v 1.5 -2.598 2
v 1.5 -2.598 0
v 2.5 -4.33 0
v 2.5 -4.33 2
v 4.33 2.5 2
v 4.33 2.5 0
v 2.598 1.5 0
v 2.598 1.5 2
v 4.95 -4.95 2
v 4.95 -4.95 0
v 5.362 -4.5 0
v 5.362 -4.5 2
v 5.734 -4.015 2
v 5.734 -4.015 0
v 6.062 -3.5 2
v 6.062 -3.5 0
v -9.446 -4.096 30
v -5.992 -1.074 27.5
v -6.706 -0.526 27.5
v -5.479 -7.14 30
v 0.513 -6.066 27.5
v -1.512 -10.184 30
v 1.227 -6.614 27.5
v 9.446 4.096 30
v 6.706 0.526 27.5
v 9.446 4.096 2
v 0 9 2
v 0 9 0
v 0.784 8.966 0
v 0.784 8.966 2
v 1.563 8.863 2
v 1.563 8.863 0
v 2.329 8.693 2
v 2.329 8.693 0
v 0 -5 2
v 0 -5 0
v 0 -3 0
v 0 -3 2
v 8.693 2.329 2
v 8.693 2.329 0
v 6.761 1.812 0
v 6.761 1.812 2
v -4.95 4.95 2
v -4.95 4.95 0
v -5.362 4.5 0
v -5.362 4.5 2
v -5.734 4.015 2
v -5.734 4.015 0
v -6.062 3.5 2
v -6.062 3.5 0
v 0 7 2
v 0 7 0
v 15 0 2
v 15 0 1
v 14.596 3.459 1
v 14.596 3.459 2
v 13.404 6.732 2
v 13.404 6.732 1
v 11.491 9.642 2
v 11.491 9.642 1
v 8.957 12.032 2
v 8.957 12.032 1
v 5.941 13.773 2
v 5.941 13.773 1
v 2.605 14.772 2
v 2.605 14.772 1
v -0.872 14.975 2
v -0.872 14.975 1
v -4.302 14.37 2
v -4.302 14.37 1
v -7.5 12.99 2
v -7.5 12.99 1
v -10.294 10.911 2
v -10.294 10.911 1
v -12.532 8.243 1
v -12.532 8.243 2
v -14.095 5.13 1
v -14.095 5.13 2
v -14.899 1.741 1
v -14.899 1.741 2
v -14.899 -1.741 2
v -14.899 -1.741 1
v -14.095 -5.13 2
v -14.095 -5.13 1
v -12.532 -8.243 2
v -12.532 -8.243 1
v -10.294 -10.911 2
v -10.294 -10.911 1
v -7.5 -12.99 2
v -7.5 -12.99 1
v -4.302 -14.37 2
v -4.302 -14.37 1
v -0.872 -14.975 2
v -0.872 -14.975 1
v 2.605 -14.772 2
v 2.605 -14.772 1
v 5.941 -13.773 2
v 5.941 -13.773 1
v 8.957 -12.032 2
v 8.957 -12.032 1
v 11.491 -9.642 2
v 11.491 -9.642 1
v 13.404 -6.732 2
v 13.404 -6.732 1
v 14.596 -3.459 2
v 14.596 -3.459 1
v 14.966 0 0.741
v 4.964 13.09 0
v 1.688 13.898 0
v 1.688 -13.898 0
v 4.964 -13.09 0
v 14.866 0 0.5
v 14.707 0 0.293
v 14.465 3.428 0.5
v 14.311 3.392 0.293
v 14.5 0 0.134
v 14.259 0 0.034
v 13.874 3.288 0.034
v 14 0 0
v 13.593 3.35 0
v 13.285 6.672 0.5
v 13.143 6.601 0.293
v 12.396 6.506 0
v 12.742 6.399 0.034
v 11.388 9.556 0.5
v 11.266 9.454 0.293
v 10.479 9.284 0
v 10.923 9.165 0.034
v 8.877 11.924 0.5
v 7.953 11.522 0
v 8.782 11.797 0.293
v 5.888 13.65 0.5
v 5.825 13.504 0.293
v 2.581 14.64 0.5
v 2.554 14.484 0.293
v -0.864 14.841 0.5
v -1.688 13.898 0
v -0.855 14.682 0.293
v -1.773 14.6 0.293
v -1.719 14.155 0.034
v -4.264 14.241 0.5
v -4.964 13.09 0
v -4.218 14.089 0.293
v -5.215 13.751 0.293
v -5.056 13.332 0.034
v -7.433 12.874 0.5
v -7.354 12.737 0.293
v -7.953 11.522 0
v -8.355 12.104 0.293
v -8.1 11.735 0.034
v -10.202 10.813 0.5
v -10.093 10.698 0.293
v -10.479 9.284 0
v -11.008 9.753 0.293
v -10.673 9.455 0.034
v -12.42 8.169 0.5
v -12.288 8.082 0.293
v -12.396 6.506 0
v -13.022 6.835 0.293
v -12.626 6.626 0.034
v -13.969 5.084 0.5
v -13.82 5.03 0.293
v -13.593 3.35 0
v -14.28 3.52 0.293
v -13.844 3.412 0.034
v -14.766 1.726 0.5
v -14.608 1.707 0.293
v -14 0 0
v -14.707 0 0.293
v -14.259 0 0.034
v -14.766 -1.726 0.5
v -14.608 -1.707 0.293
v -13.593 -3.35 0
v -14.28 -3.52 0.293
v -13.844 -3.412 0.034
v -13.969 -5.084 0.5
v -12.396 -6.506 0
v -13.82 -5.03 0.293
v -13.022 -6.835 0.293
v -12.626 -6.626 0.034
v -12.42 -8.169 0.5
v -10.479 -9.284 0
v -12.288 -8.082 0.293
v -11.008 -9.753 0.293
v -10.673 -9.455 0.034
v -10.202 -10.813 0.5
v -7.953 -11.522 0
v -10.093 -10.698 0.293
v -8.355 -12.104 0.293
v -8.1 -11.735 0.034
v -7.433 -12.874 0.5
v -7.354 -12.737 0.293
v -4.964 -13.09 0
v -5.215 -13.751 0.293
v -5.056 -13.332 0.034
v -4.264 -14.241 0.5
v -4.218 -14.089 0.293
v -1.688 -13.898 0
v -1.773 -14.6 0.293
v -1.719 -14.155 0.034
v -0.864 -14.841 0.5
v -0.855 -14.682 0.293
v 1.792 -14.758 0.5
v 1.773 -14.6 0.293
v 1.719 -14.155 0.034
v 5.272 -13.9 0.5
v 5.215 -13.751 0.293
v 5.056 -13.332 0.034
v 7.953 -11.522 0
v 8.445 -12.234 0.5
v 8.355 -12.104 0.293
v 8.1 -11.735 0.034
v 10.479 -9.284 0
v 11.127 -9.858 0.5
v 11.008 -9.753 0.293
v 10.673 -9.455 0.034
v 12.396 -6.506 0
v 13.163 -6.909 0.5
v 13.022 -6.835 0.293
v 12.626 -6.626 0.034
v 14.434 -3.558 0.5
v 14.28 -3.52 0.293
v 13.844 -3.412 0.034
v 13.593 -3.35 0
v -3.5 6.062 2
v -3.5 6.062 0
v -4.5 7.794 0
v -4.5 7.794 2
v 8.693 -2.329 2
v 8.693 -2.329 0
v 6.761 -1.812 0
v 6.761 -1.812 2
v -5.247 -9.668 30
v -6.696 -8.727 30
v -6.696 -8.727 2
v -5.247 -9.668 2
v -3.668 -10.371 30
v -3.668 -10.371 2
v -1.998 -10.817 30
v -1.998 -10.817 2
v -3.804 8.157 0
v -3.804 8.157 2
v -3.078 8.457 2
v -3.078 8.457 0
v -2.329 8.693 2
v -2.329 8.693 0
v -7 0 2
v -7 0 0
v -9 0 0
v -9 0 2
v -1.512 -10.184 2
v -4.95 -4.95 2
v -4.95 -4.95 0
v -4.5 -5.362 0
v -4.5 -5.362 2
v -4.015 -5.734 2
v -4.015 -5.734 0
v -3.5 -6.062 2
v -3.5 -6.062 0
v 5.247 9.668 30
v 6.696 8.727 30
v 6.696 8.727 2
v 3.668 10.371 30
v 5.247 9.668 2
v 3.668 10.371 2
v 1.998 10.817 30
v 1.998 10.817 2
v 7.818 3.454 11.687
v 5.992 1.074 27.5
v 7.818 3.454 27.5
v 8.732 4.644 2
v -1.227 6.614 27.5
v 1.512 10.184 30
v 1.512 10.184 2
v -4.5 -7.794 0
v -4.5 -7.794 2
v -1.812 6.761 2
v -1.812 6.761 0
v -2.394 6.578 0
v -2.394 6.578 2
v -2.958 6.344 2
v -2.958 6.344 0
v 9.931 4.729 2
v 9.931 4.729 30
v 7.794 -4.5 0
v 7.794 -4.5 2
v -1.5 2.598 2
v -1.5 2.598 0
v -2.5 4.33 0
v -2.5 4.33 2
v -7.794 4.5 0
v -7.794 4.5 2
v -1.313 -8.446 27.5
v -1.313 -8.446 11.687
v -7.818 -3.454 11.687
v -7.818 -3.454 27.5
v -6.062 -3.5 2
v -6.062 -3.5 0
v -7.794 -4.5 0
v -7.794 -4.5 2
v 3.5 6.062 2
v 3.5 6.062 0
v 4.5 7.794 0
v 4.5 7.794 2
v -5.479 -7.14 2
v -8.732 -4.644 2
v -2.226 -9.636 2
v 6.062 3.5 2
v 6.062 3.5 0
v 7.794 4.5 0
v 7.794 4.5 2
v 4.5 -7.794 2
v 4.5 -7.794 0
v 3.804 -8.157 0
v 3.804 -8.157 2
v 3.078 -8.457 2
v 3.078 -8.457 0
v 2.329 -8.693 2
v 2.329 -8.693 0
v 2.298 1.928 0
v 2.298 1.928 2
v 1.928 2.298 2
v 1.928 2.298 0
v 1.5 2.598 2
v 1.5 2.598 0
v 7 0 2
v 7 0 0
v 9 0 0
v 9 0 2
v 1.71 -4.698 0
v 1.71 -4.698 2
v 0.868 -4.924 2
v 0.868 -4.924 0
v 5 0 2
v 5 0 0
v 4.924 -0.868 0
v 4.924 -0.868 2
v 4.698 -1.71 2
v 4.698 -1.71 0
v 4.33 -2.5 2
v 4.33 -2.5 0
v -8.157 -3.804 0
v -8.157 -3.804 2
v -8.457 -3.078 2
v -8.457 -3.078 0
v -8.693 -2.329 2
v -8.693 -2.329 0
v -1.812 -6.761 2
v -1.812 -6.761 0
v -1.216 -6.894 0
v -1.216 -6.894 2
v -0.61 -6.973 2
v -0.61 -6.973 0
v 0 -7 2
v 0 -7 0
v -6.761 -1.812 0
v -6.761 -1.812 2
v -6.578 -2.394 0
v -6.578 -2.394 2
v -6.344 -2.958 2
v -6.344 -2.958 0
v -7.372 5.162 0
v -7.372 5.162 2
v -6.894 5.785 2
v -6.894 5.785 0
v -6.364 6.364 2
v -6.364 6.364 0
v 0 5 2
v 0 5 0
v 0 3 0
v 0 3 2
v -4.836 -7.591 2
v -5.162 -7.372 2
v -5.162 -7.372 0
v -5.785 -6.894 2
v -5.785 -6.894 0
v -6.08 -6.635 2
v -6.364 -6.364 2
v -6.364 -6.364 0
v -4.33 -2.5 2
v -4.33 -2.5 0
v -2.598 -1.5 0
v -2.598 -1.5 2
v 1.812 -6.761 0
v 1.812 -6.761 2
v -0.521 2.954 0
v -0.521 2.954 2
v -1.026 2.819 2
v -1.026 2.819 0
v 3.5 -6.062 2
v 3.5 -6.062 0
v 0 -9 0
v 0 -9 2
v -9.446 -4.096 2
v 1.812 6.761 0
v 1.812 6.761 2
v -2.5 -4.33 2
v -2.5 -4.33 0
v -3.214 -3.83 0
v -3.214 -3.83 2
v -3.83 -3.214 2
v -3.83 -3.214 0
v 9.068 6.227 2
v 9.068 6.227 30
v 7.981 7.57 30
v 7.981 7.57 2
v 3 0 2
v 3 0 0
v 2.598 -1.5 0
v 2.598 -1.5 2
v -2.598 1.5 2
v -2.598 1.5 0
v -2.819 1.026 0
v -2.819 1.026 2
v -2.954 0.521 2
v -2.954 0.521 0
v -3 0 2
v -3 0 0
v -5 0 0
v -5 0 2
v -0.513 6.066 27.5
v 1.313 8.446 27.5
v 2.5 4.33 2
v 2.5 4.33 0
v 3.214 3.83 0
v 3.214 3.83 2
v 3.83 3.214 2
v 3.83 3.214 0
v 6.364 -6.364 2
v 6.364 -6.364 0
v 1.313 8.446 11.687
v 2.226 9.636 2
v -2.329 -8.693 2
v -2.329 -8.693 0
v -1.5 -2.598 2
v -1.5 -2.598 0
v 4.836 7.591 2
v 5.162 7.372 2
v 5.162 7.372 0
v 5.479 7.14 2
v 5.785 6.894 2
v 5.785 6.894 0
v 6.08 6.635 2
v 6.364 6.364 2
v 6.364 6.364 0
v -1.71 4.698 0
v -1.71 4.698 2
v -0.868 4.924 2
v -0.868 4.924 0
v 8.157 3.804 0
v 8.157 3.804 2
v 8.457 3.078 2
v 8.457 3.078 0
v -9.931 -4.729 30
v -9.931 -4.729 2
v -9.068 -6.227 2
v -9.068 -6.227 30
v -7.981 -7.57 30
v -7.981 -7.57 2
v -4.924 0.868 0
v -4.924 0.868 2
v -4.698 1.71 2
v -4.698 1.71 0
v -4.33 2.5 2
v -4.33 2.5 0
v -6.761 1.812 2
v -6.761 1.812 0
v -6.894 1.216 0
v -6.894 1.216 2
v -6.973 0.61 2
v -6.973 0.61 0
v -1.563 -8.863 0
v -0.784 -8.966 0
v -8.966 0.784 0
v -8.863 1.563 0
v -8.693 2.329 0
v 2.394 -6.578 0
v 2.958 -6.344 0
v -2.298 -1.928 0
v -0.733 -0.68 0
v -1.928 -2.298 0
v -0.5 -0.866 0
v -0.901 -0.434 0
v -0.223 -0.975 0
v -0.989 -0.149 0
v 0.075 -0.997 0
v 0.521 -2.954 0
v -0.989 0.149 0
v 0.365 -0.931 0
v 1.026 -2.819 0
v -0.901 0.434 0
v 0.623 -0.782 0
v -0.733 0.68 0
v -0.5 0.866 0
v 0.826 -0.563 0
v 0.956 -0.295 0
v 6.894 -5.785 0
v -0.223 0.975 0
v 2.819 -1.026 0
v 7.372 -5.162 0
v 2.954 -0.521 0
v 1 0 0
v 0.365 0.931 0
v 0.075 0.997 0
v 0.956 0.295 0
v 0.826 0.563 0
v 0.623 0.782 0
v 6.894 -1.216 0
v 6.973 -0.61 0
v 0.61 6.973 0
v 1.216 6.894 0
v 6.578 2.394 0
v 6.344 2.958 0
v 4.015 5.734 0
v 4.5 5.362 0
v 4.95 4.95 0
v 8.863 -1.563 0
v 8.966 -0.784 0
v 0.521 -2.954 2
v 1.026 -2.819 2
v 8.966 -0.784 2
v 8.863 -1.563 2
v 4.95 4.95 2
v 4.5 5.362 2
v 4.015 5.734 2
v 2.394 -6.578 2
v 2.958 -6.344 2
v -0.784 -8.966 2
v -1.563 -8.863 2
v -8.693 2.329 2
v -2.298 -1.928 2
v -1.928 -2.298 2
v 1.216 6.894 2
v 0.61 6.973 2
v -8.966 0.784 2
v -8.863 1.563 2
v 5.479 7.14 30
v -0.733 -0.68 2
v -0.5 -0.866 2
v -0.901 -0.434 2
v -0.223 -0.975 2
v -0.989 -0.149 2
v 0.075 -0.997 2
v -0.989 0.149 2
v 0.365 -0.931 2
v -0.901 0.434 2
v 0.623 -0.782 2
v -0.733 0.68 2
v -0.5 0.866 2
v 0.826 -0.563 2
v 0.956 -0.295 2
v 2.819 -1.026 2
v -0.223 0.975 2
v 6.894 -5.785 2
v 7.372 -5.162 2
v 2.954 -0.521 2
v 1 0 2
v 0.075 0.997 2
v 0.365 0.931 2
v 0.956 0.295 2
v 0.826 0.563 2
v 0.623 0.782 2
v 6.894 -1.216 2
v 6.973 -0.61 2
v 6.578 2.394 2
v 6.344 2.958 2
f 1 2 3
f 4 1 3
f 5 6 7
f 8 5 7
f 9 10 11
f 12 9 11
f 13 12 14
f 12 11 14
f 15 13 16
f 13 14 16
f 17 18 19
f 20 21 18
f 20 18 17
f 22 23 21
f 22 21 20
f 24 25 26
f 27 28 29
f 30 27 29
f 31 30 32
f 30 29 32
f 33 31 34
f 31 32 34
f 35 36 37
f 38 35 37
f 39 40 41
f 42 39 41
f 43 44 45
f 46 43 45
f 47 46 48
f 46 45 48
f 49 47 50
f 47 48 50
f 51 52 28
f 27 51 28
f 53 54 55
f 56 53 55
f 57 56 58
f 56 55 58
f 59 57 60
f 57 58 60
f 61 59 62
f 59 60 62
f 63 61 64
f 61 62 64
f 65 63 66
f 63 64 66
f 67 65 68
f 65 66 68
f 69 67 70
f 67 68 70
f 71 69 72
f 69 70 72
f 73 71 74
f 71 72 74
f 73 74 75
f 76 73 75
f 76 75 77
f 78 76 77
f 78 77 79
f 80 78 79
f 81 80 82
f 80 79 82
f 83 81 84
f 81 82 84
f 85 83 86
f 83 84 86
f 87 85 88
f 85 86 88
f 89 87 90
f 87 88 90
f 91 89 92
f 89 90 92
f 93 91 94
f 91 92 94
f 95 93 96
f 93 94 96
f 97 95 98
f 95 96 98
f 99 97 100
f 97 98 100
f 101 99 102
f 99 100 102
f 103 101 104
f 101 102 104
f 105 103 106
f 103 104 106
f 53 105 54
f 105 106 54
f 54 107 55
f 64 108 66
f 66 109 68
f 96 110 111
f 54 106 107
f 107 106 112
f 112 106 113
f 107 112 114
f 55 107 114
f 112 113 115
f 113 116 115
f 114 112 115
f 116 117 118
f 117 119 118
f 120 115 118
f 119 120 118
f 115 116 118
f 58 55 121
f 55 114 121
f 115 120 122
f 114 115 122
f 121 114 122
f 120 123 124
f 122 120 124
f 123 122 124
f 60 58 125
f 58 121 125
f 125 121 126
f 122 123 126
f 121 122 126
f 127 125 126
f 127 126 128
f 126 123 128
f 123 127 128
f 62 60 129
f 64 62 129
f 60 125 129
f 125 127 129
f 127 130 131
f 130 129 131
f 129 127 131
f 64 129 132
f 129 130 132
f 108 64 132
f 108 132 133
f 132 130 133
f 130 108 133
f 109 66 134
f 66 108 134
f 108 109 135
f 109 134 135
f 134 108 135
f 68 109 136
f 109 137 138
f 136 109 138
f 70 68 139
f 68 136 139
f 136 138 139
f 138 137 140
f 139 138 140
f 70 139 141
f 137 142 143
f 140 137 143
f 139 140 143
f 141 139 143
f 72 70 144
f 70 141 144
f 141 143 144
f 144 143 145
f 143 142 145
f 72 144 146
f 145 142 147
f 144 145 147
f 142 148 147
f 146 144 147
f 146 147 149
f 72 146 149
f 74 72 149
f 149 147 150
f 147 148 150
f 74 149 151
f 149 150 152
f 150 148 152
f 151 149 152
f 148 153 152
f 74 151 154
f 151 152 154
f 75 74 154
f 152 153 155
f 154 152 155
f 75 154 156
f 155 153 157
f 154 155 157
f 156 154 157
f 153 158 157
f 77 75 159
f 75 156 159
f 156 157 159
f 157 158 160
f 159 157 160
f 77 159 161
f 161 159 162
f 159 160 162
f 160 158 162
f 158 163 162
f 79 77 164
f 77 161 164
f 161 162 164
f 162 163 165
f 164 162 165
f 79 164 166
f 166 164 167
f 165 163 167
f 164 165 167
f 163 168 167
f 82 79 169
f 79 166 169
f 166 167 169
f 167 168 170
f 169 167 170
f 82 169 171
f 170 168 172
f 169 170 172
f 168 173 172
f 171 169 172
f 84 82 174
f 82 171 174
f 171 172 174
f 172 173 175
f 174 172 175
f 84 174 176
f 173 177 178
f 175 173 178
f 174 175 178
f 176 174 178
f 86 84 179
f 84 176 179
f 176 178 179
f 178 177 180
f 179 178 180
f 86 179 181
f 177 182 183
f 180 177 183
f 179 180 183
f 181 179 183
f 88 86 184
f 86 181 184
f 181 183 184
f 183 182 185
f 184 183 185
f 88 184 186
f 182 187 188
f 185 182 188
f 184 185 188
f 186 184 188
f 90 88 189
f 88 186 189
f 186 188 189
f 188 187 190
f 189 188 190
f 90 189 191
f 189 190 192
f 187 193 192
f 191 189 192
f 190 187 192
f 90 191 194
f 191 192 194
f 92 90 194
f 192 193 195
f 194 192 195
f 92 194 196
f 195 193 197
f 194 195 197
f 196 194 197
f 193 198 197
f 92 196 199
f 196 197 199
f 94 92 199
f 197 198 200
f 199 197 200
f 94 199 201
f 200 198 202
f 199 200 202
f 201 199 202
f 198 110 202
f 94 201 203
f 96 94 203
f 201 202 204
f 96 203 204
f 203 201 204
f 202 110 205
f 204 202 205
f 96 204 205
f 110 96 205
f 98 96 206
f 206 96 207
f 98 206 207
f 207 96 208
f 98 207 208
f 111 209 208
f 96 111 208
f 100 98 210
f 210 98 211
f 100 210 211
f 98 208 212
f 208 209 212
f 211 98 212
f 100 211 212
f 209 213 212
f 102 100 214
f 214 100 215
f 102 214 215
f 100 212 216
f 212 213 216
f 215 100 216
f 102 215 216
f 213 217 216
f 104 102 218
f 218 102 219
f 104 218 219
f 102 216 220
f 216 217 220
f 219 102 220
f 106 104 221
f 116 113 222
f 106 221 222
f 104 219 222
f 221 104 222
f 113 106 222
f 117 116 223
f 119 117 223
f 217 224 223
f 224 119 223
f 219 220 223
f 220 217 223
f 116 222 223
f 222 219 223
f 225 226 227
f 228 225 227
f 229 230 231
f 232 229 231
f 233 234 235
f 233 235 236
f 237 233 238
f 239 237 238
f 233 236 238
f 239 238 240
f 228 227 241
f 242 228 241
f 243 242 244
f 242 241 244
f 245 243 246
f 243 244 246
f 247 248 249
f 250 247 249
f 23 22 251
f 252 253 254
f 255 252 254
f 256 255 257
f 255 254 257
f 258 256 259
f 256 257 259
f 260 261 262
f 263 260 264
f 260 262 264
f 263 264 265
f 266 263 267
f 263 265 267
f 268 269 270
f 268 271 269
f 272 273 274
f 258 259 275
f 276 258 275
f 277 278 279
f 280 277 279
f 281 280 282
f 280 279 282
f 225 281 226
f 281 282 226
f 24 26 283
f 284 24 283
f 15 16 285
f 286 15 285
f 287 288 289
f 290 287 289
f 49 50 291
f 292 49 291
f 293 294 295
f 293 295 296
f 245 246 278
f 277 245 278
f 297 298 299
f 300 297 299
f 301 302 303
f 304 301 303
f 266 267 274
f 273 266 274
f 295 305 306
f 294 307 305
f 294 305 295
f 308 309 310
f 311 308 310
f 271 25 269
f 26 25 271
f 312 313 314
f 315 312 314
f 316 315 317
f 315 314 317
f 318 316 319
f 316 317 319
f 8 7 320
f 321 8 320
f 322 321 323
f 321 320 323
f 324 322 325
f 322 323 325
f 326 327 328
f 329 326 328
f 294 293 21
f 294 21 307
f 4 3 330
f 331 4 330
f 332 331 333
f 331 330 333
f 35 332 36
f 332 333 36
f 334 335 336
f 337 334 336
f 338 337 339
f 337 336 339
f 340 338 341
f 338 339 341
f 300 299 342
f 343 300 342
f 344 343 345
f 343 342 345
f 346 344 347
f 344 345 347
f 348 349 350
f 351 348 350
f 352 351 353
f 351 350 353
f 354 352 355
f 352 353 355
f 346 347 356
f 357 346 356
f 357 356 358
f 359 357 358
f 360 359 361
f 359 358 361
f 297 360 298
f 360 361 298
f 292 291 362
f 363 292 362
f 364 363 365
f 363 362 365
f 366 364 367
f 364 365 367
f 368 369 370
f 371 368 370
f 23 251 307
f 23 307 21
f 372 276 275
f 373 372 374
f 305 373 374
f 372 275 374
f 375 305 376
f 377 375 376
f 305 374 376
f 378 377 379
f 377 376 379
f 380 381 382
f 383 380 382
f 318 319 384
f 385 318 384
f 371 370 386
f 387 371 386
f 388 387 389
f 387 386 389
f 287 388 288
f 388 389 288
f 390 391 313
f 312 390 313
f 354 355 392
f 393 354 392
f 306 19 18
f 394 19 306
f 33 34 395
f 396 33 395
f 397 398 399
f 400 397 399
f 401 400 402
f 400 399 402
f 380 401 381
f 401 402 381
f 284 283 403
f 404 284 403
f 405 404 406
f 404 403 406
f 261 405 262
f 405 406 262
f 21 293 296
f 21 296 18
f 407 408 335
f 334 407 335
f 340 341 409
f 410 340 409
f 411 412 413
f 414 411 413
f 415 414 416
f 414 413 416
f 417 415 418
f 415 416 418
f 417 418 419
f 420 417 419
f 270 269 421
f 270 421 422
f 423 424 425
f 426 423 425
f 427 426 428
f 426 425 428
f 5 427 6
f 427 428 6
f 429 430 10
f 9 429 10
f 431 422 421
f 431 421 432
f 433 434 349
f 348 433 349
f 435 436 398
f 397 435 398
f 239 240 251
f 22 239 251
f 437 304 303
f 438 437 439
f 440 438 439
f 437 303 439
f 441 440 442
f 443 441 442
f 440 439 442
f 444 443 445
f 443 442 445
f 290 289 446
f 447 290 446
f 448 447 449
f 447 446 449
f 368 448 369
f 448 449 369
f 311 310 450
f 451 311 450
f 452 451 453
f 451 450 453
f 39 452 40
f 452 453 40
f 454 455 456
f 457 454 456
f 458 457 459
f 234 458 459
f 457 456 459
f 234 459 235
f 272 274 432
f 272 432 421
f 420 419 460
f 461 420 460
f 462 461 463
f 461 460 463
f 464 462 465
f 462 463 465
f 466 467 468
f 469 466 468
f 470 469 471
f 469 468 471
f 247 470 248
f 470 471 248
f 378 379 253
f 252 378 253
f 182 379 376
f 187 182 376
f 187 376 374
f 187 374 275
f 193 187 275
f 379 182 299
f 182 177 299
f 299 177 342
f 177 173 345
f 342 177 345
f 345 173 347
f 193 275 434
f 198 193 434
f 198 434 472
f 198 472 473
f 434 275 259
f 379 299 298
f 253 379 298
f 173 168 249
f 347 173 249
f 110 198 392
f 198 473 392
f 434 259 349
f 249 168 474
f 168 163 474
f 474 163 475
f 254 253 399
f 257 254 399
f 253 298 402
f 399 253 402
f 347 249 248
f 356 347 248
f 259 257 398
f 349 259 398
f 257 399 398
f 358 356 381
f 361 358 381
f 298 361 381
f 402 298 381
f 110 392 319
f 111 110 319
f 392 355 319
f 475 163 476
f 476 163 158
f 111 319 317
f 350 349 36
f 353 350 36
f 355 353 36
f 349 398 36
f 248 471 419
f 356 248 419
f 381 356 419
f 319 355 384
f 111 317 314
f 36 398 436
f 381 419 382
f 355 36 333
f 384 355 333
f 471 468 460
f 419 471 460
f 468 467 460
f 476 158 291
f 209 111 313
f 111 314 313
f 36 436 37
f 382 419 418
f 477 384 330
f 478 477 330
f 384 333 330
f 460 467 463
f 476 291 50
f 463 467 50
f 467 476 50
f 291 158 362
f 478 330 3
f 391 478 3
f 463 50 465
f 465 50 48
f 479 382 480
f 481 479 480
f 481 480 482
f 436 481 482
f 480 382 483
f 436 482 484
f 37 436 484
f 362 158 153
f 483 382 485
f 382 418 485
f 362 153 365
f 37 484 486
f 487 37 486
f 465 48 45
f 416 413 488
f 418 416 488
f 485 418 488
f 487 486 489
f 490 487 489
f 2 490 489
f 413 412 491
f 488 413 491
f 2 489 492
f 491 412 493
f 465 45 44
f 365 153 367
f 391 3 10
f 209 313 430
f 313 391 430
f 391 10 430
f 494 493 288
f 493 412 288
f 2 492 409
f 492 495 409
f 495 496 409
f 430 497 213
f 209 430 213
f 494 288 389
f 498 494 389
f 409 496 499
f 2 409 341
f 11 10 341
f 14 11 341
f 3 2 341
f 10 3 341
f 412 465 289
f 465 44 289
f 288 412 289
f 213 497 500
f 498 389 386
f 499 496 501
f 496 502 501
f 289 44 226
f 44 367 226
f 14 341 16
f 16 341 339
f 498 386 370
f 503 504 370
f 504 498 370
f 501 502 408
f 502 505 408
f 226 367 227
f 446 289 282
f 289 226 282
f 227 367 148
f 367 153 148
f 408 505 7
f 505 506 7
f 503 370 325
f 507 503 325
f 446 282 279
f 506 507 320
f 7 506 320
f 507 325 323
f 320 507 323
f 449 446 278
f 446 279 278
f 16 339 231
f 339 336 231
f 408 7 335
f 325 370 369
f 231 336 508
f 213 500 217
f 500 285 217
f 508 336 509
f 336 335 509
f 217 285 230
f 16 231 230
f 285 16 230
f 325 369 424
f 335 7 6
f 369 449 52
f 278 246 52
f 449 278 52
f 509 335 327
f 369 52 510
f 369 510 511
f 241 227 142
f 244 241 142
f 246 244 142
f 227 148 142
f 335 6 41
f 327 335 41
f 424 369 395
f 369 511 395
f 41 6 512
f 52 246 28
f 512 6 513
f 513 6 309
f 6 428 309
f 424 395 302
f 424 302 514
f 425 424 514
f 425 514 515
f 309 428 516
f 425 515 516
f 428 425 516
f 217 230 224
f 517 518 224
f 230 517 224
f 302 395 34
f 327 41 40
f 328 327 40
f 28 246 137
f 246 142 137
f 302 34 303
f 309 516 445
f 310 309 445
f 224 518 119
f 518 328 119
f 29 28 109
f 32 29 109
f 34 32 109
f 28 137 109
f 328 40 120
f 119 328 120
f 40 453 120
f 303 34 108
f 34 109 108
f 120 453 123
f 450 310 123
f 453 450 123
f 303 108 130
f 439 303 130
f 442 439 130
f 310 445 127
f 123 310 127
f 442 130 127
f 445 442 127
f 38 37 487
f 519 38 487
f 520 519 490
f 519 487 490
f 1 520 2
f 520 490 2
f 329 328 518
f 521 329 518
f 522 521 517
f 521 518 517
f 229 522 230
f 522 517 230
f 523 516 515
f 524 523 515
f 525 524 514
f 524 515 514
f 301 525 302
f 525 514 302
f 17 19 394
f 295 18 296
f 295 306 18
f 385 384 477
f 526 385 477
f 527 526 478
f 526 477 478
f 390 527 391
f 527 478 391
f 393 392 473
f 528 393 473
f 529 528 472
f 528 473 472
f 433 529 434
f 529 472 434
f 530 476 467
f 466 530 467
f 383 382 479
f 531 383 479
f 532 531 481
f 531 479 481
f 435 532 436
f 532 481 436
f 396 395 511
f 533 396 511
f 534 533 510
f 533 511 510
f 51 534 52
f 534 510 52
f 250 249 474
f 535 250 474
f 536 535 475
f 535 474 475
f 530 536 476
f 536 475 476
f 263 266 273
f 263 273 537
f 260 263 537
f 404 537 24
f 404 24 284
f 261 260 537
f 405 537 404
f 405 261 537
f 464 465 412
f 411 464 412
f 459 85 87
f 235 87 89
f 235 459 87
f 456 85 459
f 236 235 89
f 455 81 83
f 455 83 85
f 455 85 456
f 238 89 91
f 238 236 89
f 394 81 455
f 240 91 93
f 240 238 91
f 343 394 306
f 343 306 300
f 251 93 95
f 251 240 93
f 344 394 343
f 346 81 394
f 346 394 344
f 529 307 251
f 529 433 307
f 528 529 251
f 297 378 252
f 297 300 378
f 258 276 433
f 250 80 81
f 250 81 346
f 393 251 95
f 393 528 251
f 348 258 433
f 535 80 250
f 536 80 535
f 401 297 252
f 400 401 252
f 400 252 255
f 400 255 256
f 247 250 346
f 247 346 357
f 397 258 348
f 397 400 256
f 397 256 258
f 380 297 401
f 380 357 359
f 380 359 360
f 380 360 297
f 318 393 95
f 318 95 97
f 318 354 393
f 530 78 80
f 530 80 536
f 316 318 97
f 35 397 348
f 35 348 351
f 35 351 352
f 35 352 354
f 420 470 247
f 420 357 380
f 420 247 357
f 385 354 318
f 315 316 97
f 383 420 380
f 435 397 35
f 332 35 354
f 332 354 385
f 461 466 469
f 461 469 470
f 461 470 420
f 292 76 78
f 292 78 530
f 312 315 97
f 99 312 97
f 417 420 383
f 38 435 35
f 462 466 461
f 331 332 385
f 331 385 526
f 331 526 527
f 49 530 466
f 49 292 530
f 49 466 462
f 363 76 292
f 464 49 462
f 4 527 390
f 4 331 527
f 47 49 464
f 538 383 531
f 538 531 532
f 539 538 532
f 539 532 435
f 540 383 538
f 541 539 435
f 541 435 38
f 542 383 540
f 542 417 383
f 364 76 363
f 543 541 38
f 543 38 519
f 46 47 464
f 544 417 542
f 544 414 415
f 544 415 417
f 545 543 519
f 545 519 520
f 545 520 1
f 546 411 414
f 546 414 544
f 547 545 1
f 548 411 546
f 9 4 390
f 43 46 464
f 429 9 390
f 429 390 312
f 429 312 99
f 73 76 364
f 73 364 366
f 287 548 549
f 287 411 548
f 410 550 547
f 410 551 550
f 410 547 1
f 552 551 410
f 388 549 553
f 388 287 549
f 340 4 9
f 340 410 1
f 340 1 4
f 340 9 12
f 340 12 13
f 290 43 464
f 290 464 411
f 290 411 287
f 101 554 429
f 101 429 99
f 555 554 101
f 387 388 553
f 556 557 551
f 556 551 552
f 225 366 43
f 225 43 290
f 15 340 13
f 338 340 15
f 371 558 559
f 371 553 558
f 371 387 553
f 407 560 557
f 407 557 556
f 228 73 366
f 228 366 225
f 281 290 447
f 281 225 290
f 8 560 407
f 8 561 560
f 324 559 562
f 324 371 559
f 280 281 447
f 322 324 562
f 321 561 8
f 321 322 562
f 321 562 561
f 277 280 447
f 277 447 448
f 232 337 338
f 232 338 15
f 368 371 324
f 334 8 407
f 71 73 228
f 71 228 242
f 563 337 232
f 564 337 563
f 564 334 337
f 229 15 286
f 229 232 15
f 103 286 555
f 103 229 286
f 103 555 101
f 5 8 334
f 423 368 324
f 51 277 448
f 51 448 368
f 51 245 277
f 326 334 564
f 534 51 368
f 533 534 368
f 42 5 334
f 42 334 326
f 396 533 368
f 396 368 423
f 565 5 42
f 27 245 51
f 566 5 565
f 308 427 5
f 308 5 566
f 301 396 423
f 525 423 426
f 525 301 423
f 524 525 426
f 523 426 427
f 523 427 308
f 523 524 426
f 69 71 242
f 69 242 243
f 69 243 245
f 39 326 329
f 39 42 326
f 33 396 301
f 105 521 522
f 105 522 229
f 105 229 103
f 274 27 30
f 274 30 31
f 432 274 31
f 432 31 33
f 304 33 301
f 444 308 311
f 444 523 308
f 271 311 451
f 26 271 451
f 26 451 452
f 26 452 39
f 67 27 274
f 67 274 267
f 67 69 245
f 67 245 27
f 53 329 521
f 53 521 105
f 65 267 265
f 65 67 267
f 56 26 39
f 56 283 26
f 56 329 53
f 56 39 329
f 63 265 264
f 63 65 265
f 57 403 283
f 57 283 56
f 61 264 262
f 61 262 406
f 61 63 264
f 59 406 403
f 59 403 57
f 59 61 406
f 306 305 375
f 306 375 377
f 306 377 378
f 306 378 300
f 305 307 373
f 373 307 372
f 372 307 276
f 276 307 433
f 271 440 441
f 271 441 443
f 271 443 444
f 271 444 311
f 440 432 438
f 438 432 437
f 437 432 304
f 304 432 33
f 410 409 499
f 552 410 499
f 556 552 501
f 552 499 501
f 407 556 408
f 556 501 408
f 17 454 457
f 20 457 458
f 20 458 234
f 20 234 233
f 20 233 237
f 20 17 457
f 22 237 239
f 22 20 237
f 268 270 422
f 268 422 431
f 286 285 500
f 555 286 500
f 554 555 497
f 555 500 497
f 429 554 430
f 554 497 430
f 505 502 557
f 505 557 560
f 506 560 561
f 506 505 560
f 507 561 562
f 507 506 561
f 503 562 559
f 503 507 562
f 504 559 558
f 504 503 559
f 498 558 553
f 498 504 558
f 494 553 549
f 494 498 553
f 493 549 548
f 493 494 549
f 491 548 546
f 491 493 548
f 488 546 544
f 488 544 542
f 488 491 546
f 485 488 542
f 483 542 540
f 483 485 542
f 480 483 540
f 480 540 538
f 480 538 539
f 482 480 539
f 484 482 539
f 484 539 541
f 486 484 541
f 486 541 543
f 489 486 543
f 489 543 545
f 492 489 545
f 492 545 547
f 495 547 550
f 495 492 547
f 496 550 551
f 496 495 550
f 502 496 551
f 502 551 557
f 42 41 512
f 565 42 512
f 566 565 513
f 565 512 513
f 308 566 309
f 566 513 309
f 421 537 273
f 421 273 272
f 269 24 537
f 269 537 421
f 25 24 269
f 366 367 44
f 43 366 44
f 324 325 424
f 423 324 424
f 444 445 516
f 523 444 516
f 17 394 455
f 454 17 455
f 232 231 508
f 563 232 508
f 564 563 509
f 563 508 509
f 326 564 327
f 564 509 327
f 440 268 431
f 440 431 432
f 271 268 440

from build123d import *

# Parameters (mm, degrees)
F0_R     = 15
F0_R_2   = 1
F1_DEPTH = 2
F3_DEPTH = 28
F5_DEPTH = 10
F7_DEPTH = 0.9
F9_DEPTH = 0.9
F10_R    = 1


with BuildPart() as f1:
    # F0 (on Top) → F1 (new body)
    with BuildSketch(Plane.XY):
        Circle(F0_R)
        with BuildLine():
            Line((0, -7), (0, -9))
            ThreePointArc((0, -9), (-1.17473573, -8.9230037524), (-2.3293714059, -8.6933324366))
            Line((-2.3293714059, -8.6933324366), (-1.8117333157, -6.761480784))
            ThreePointArc((-1.8117333157, -6.761480784), (-0.9136833455, -6.9401140296), (0, -7))
        make_face(mode=Mode.SUBTRACT)
        with BuildLine():
            Line((-3.5, -6.0621778265), (-4.5, -7.7942286341))
            ThreePointArc((-4.5, -7.7942286341), (-5.4788528611, -7.1401800626), (-6.3639610307, -6.3639610307))
            Line((-6.3639610307, -6.3639610307), (-4.9497474683, -4.9497474683))
            ThreePointArc((-4.9497474683, -4.9497474683), (-4.2613300031, -5.553473382), (-3.5, -6.0621778265))
        make_face(mode=Mode.SUBTRACT)
        with BuildLine():
            Line((-6.0621778265, -3.5), (-7.7942286341, -4.5))
            ThreePointArc((-7.7942286341, -4.5), (-8.3149157926, -3.4441508913), (-8.6933324366, -2.3293714059))
            Line((-8.6933324366, -2.3293714059), (-6.761480784, -1.8117333157))
            ThreePointArc((-6.761480784, -1.8117333157), (-6.4671567276, -2.6787840266), (-6.0621778265, -3.5))
        make_face(mode=Mode.SUBTRACT)
        with BuildLine():
            Line((-4.3301270189, -2.5), (-2.5980762114, -1.5))
            ThreePointArc((-2.5980762114, -1.5), (-2.1213203436, -2.1213203436), (-1.5, -2.5980762114))
            Line((-1.5, -2.5980762114), (-2.5, -4.3301270189))
            ThreePointArc((-2.5, -4.3301270189), (-3.5355339059, -3.5355339059), (-4.3301270189, -2.5))
        make_face(mode=Mode.SUBTRACT)
        with BuildLine():
            Line((3.5, -6.0621778265), (4.5, -7.7942286341))
            ThreePointArc((4.5, -7.7942286341), (3.4441508913, -8.3149157926), (2.3293714059, -8.6933324366))
            Line((2.3293714059, -8.6933324366), (1.8117333157, -6.761480784))
            ThreePointArc((1.8117333157, -6.761480784), (2.6787840266, -6.4671567276), (3.5, -6.0621778265))
        make_face(mode=Mode.SUBTRACT)
        with BuildLine():
            Line((0, -5), (0, -3))
            ThreePointArc((0, -3), (0.7764571353, -2.8977774789), (1.5, -2.5980762114))
            Line((1.5, -2.5980762114), (2.5, -4.3301270189))
            ThreePointArc((2.5, -4.3301270189), (1.2940952255, -4.8296291314), (0, -5))
        make_face(mode=Mode.SUBTRACT)
        with BuildLine():
            Line((6.0621778265, -3.5), (7.7942286341, -4.5))
            ThreePointArc((7.7942286341, -4.5), (7.1401800626, -5.4788528611), (6.3639610307, -6.3639610307))
            Line((6.3639610307, -6.3639610307), (4.9497474683, -4.9497474683))
            ThreePointArc((4.9497474683, -4.9497474683), (5.553473382, -4.2613300031), (6.0621778265, -3.5))
        make_face(mode=Mode.SUBTRACT)
        with BuildLine():
            Line((4.3301270189, -2.5), (2.5980762114, -1.5))
            ThreePointArc((2.5980762114, -1.5), (2.8977774789, -0.7764571353), (3, 0))
            Line((3, 0), (5, 0))
            ThreePointArc((5, 0), (4.8296291314, -1.2940952255), (4.3301270189, -2.5))
        make_face(mode=Mode.SUBTRACT)
        with BuildLine():
            Line((7, 0), (9, 0))
            ThreePointArc((9, 0), (8.9230037524, -1.17473573), (8.6933324366, -2.3293714059))
            Line((8.6933324366, -2.3293714059), (6.761480784, -1.8117333157))
            ThreePointArc((6.761480784, -1.8117333157), (6.9401140296, -0.9136833455), (7, 0))
        make_face(mode=Mode.SUBTRACT)
        with BuildLine():
            ThreePointArc((-6.761480784, 1.8117333157), (-6.9401140296, 0.9136833455), (-7, 0))
            Line((-7, 0), (-9, 0))
            ThreePointArc((-9, 0), (-8.9230037524, 1.17473573), (-8.6933324366, 2.3293714059))
            Line((-8.6933324366, 2.3293714059), (-6.761480784, 1.8117333157))
        make_face(mode=Mode.SUBTRACT)
        with BuildLine():
            ThreePointArc((-2.5980762114, 1.5), (-2.8977774789, 0.7764571353), (-3, 0))
            Line((-3, 0), (-5, 0))
            ThreePointArc((-5, 0), (-4.8296291314, 1.2940952255), (-4.3301270189, 2.5))
            Line((-4.3301270189, 2.5), (-2.5980762114, 1.5))
        make_face(mode=Mode.SUBTRACT)
        with BuildLine():
            Line((-6.0621778265, 3.5), (-7.7942286341, 4.5))
            ThreePointArc((-7.7942286341, 4.5), (-7.1401800626, 5.4788528611), (-6.3639610307, 6.3639610307))
            Line((-6.3639610307, 6.3639610307), (-4.9497474683, 4.9497474683))
            ThreePointArc((-4.9497474683, 4.9497474683), (-5.553473382, 4.2613300031), (-6.0621778265, 3.5))
        make_face(mode=Mode.SUBTRACT)
        with BuildLine():
            ThreePointArc((0, 3), (-0.7764571353, 2.8977774789), (-1.5, 2.5980762114))
            Line((-1.5, 2.5980762114), (-2.5, 4.3301270189))
            ThreePointArc((-2.5, 4.3301270189), (-1.2940952255, 4.8296291314), (0, 5))
            Line((0, 5), (0, 3))
        make_face(mode=Mode.SUBTRACT)
        with BuildLine():
            Line((-3.5, 6.0621778265), (-4.5, 7.7942286341))
            ThreePointArc((-4.5, 7.7942286341), (-3.4441508913, 8.3149157926), (-2.3293714059, 8.6933324366))
            Line((-2.3293714059, 8.6933324366), (-1.8117333157, 6.761480784))
            ThreePointArc((-1.8117333157, 6.761480784), (-2.6787840266, 6.4671567276), (-3.5, 6.0621778265))
        make_face(mode=Mode.SUBTRACT)
        Circle(F0_R_2, mode=Mode.SUBTRACT)
        with BuildLine():
            Line((4.3301270189, 2.5), (2.5980762114, 1.5))
            ThreePointArc((2.5980762114, 1.5), (2.1213203436, 2.1213203436), (1.5, 2.5980762114))
            Line((1.5, 2.5980762114), (2.5, 4.3301270189))
            ThreePointArc((2.5, 4.3301270189), (3.5355339059, 3.5355339059), (4.3301270189, 2.5))
        make_face(mode=Mode.SUBTRACT)
        with BuildLine():
            Line((6.0621778265, 3.5), (7.7942286341, 4.5))
            ThreePointArc((7.7942286341, 4.5), (8.3149157926, 3.4441508913), (8.6933324366, 2.3293714059))
            Line((8.6933324366, 2.3293714059), (6.761480784, 1.8117333157))
            ThreePointArc((6.761480784, 1.8117333157), (6.4671567276, 2.6787840266), (6.0621778265, 3.5))
        make_face(mode=Mode.SUBTRACT)
        with BuildLine():
            Line((3.5, 6.0621778265), (4.5, 7.7942286341))
            ThreePointArc((4.5, 7.7942286341), (5.4788528611, 7.1401800626), (6.3639610307, 6.3639610307))
            Line((6.3639610307, 6.3639610307), (4.9497474683, 4.9497474683))
            ThreePointArc((4.9497474683, 4.9497474683), (4.2613300031, 5.553473382), (3.5, 6.0621778265))
        make_face(mode=Mode.SUBTRACT)
        with BuildLine():
            Line((0, 7), (0, 9))
            ThreePointArc((0, 9), (1.17473573, 8.9230037524), (2.3293714059, 8.6933324366))
            Line((2.3293714059, 8.6933324366), (1.8117333157, 6.761480784))
            ThreePointArc((1.8117333157, 6.761480784), (0.9136833455, 6.9401140296), (0, 7))
        make_face(mode=Mode.SUBTRACT)
    extrude(amount=F1_DEPTH)

    # F2 (on face) → F3 (join)
    with BuildSketch(Plane.XY.offset(2)):
        with BuildLine():
            Line((6.6963757191, 8.7268867432), (5.4788528611, 7.1401800626))
            Line((5.4788528342, 7.1401800833), (9.4456195625, 4.0963729176))
            Line((9.4456195625, 4.0963729176), (9.9313862061, 4.7294363327))
            ThreePointArc((9.9313862061, 4.7294363327), (8.5507613173, 6.9198613349), (6.6963757191, 8.7268867432))
        make_face()
        with BuildLine():
            Line((1.9978528032, 10.8170506228), (1.5120861596, 10.1839872077))
            Line((1.5120861596, 10.1839872077), (5.4788528342, 7.1401800833))
            Line((5.4788528611, 7.1401800626), (6.6963757191, 8.7268867432))
            ThreePointArc((6.6963757191, 8.7268867432), (4.4709728986, 10.0503930938), (1.9978528032, 10.8170506228))
        make_face()
        with BuildLine():
            Line((-9.4456195625, -4.0963729176), (-9.9313862061, -4.7294363327))
            ThreePointArc((-9.9313862061, -4.7294363327), (-8.5507612755, -6.9198613865), (-6.6963756136, -8.7268868241))
            ThreePointArc((-6.6963756136, -8.7268868241), (-4.4709728379, -10.0503931208), (-1.9978528032, -10.8170506228))
            Line((-1.9978528032, -10.8170506228), (-1.5120861596, -10.1839872077))
            Line((-1.5120861596, -10.1839872077), (-5.47885283, -7.1401800865))
            Line((-5.47885283, -7.1401800865), (-9.4456195625, -4.0963729176))
        make_face()
    extrude(amount=F3_DEPTH)

    # F4 (on face) → F5 (join)
    with BuildSketch(Plane(origin=(3.9667667015, -3.043807145, 0), x_dir=(0.608761429, 0.7933533403, 0), z_dir=(0.7933533403, -0.608761429, 0))):
        Polygon((-4.5, 27.5), (-9, 30), (-9, 2), (-7.5, 11.6874175146), (-7.5, 27.5), align=None)
        Polygon((4.5, 27.5), (7.5, 27.5), (7.5, 11.6874175146), (9, 2), (9, 30), align=None)
    extrude(amount=-F5_DEPTH)

    # F6 (on face) → F7 (join)
    with BuildSketch(Plane(origin=(3.9667667015, -3.043807145, 0), x_dir=(0.608761429, 0.7933533403, 0), z_dir=(0.7933533403, -0.608761429, 0))):
        Polygon((-9, 2), (-4.5, 27.5), (-7.5, 27.5), (-7.5, 22.8047555536), align=None)
        Polygon((7.5, 22.8047555536), (7.5, 27.5), (4.5, 27.5), (9, 2), align=None)
    extrude(amount=-F7_DEPTH)

    # F8 (on face) → F9 (join)
    with BuildSketch(Plane(origin=(-3.9667667015, 3.043807145, 0), x_dir=(-0.608761429, -0.7933533403, 0), z_dir=(-0.7933533403, 0.608761429, 0))):
        Polygon((-9, 2), (-4.5, 27.5), (-7.5, 27.5), (-7.5, 11.6874175146), align=None)
        Polygon((7.5, 27.5), (4.5, 27.5), (9, 2), (7.5, 11.6874175146), align=None)
    extrude(amount=-F9_DEPTH)

    # F10
    f10_edges = [f1.edges().sort_by_distance(p)[0] for p in [
        (-15, 0, 0),
    ]]
    fillet(f10_edges, radius=F10_R)


solid = f1.part
